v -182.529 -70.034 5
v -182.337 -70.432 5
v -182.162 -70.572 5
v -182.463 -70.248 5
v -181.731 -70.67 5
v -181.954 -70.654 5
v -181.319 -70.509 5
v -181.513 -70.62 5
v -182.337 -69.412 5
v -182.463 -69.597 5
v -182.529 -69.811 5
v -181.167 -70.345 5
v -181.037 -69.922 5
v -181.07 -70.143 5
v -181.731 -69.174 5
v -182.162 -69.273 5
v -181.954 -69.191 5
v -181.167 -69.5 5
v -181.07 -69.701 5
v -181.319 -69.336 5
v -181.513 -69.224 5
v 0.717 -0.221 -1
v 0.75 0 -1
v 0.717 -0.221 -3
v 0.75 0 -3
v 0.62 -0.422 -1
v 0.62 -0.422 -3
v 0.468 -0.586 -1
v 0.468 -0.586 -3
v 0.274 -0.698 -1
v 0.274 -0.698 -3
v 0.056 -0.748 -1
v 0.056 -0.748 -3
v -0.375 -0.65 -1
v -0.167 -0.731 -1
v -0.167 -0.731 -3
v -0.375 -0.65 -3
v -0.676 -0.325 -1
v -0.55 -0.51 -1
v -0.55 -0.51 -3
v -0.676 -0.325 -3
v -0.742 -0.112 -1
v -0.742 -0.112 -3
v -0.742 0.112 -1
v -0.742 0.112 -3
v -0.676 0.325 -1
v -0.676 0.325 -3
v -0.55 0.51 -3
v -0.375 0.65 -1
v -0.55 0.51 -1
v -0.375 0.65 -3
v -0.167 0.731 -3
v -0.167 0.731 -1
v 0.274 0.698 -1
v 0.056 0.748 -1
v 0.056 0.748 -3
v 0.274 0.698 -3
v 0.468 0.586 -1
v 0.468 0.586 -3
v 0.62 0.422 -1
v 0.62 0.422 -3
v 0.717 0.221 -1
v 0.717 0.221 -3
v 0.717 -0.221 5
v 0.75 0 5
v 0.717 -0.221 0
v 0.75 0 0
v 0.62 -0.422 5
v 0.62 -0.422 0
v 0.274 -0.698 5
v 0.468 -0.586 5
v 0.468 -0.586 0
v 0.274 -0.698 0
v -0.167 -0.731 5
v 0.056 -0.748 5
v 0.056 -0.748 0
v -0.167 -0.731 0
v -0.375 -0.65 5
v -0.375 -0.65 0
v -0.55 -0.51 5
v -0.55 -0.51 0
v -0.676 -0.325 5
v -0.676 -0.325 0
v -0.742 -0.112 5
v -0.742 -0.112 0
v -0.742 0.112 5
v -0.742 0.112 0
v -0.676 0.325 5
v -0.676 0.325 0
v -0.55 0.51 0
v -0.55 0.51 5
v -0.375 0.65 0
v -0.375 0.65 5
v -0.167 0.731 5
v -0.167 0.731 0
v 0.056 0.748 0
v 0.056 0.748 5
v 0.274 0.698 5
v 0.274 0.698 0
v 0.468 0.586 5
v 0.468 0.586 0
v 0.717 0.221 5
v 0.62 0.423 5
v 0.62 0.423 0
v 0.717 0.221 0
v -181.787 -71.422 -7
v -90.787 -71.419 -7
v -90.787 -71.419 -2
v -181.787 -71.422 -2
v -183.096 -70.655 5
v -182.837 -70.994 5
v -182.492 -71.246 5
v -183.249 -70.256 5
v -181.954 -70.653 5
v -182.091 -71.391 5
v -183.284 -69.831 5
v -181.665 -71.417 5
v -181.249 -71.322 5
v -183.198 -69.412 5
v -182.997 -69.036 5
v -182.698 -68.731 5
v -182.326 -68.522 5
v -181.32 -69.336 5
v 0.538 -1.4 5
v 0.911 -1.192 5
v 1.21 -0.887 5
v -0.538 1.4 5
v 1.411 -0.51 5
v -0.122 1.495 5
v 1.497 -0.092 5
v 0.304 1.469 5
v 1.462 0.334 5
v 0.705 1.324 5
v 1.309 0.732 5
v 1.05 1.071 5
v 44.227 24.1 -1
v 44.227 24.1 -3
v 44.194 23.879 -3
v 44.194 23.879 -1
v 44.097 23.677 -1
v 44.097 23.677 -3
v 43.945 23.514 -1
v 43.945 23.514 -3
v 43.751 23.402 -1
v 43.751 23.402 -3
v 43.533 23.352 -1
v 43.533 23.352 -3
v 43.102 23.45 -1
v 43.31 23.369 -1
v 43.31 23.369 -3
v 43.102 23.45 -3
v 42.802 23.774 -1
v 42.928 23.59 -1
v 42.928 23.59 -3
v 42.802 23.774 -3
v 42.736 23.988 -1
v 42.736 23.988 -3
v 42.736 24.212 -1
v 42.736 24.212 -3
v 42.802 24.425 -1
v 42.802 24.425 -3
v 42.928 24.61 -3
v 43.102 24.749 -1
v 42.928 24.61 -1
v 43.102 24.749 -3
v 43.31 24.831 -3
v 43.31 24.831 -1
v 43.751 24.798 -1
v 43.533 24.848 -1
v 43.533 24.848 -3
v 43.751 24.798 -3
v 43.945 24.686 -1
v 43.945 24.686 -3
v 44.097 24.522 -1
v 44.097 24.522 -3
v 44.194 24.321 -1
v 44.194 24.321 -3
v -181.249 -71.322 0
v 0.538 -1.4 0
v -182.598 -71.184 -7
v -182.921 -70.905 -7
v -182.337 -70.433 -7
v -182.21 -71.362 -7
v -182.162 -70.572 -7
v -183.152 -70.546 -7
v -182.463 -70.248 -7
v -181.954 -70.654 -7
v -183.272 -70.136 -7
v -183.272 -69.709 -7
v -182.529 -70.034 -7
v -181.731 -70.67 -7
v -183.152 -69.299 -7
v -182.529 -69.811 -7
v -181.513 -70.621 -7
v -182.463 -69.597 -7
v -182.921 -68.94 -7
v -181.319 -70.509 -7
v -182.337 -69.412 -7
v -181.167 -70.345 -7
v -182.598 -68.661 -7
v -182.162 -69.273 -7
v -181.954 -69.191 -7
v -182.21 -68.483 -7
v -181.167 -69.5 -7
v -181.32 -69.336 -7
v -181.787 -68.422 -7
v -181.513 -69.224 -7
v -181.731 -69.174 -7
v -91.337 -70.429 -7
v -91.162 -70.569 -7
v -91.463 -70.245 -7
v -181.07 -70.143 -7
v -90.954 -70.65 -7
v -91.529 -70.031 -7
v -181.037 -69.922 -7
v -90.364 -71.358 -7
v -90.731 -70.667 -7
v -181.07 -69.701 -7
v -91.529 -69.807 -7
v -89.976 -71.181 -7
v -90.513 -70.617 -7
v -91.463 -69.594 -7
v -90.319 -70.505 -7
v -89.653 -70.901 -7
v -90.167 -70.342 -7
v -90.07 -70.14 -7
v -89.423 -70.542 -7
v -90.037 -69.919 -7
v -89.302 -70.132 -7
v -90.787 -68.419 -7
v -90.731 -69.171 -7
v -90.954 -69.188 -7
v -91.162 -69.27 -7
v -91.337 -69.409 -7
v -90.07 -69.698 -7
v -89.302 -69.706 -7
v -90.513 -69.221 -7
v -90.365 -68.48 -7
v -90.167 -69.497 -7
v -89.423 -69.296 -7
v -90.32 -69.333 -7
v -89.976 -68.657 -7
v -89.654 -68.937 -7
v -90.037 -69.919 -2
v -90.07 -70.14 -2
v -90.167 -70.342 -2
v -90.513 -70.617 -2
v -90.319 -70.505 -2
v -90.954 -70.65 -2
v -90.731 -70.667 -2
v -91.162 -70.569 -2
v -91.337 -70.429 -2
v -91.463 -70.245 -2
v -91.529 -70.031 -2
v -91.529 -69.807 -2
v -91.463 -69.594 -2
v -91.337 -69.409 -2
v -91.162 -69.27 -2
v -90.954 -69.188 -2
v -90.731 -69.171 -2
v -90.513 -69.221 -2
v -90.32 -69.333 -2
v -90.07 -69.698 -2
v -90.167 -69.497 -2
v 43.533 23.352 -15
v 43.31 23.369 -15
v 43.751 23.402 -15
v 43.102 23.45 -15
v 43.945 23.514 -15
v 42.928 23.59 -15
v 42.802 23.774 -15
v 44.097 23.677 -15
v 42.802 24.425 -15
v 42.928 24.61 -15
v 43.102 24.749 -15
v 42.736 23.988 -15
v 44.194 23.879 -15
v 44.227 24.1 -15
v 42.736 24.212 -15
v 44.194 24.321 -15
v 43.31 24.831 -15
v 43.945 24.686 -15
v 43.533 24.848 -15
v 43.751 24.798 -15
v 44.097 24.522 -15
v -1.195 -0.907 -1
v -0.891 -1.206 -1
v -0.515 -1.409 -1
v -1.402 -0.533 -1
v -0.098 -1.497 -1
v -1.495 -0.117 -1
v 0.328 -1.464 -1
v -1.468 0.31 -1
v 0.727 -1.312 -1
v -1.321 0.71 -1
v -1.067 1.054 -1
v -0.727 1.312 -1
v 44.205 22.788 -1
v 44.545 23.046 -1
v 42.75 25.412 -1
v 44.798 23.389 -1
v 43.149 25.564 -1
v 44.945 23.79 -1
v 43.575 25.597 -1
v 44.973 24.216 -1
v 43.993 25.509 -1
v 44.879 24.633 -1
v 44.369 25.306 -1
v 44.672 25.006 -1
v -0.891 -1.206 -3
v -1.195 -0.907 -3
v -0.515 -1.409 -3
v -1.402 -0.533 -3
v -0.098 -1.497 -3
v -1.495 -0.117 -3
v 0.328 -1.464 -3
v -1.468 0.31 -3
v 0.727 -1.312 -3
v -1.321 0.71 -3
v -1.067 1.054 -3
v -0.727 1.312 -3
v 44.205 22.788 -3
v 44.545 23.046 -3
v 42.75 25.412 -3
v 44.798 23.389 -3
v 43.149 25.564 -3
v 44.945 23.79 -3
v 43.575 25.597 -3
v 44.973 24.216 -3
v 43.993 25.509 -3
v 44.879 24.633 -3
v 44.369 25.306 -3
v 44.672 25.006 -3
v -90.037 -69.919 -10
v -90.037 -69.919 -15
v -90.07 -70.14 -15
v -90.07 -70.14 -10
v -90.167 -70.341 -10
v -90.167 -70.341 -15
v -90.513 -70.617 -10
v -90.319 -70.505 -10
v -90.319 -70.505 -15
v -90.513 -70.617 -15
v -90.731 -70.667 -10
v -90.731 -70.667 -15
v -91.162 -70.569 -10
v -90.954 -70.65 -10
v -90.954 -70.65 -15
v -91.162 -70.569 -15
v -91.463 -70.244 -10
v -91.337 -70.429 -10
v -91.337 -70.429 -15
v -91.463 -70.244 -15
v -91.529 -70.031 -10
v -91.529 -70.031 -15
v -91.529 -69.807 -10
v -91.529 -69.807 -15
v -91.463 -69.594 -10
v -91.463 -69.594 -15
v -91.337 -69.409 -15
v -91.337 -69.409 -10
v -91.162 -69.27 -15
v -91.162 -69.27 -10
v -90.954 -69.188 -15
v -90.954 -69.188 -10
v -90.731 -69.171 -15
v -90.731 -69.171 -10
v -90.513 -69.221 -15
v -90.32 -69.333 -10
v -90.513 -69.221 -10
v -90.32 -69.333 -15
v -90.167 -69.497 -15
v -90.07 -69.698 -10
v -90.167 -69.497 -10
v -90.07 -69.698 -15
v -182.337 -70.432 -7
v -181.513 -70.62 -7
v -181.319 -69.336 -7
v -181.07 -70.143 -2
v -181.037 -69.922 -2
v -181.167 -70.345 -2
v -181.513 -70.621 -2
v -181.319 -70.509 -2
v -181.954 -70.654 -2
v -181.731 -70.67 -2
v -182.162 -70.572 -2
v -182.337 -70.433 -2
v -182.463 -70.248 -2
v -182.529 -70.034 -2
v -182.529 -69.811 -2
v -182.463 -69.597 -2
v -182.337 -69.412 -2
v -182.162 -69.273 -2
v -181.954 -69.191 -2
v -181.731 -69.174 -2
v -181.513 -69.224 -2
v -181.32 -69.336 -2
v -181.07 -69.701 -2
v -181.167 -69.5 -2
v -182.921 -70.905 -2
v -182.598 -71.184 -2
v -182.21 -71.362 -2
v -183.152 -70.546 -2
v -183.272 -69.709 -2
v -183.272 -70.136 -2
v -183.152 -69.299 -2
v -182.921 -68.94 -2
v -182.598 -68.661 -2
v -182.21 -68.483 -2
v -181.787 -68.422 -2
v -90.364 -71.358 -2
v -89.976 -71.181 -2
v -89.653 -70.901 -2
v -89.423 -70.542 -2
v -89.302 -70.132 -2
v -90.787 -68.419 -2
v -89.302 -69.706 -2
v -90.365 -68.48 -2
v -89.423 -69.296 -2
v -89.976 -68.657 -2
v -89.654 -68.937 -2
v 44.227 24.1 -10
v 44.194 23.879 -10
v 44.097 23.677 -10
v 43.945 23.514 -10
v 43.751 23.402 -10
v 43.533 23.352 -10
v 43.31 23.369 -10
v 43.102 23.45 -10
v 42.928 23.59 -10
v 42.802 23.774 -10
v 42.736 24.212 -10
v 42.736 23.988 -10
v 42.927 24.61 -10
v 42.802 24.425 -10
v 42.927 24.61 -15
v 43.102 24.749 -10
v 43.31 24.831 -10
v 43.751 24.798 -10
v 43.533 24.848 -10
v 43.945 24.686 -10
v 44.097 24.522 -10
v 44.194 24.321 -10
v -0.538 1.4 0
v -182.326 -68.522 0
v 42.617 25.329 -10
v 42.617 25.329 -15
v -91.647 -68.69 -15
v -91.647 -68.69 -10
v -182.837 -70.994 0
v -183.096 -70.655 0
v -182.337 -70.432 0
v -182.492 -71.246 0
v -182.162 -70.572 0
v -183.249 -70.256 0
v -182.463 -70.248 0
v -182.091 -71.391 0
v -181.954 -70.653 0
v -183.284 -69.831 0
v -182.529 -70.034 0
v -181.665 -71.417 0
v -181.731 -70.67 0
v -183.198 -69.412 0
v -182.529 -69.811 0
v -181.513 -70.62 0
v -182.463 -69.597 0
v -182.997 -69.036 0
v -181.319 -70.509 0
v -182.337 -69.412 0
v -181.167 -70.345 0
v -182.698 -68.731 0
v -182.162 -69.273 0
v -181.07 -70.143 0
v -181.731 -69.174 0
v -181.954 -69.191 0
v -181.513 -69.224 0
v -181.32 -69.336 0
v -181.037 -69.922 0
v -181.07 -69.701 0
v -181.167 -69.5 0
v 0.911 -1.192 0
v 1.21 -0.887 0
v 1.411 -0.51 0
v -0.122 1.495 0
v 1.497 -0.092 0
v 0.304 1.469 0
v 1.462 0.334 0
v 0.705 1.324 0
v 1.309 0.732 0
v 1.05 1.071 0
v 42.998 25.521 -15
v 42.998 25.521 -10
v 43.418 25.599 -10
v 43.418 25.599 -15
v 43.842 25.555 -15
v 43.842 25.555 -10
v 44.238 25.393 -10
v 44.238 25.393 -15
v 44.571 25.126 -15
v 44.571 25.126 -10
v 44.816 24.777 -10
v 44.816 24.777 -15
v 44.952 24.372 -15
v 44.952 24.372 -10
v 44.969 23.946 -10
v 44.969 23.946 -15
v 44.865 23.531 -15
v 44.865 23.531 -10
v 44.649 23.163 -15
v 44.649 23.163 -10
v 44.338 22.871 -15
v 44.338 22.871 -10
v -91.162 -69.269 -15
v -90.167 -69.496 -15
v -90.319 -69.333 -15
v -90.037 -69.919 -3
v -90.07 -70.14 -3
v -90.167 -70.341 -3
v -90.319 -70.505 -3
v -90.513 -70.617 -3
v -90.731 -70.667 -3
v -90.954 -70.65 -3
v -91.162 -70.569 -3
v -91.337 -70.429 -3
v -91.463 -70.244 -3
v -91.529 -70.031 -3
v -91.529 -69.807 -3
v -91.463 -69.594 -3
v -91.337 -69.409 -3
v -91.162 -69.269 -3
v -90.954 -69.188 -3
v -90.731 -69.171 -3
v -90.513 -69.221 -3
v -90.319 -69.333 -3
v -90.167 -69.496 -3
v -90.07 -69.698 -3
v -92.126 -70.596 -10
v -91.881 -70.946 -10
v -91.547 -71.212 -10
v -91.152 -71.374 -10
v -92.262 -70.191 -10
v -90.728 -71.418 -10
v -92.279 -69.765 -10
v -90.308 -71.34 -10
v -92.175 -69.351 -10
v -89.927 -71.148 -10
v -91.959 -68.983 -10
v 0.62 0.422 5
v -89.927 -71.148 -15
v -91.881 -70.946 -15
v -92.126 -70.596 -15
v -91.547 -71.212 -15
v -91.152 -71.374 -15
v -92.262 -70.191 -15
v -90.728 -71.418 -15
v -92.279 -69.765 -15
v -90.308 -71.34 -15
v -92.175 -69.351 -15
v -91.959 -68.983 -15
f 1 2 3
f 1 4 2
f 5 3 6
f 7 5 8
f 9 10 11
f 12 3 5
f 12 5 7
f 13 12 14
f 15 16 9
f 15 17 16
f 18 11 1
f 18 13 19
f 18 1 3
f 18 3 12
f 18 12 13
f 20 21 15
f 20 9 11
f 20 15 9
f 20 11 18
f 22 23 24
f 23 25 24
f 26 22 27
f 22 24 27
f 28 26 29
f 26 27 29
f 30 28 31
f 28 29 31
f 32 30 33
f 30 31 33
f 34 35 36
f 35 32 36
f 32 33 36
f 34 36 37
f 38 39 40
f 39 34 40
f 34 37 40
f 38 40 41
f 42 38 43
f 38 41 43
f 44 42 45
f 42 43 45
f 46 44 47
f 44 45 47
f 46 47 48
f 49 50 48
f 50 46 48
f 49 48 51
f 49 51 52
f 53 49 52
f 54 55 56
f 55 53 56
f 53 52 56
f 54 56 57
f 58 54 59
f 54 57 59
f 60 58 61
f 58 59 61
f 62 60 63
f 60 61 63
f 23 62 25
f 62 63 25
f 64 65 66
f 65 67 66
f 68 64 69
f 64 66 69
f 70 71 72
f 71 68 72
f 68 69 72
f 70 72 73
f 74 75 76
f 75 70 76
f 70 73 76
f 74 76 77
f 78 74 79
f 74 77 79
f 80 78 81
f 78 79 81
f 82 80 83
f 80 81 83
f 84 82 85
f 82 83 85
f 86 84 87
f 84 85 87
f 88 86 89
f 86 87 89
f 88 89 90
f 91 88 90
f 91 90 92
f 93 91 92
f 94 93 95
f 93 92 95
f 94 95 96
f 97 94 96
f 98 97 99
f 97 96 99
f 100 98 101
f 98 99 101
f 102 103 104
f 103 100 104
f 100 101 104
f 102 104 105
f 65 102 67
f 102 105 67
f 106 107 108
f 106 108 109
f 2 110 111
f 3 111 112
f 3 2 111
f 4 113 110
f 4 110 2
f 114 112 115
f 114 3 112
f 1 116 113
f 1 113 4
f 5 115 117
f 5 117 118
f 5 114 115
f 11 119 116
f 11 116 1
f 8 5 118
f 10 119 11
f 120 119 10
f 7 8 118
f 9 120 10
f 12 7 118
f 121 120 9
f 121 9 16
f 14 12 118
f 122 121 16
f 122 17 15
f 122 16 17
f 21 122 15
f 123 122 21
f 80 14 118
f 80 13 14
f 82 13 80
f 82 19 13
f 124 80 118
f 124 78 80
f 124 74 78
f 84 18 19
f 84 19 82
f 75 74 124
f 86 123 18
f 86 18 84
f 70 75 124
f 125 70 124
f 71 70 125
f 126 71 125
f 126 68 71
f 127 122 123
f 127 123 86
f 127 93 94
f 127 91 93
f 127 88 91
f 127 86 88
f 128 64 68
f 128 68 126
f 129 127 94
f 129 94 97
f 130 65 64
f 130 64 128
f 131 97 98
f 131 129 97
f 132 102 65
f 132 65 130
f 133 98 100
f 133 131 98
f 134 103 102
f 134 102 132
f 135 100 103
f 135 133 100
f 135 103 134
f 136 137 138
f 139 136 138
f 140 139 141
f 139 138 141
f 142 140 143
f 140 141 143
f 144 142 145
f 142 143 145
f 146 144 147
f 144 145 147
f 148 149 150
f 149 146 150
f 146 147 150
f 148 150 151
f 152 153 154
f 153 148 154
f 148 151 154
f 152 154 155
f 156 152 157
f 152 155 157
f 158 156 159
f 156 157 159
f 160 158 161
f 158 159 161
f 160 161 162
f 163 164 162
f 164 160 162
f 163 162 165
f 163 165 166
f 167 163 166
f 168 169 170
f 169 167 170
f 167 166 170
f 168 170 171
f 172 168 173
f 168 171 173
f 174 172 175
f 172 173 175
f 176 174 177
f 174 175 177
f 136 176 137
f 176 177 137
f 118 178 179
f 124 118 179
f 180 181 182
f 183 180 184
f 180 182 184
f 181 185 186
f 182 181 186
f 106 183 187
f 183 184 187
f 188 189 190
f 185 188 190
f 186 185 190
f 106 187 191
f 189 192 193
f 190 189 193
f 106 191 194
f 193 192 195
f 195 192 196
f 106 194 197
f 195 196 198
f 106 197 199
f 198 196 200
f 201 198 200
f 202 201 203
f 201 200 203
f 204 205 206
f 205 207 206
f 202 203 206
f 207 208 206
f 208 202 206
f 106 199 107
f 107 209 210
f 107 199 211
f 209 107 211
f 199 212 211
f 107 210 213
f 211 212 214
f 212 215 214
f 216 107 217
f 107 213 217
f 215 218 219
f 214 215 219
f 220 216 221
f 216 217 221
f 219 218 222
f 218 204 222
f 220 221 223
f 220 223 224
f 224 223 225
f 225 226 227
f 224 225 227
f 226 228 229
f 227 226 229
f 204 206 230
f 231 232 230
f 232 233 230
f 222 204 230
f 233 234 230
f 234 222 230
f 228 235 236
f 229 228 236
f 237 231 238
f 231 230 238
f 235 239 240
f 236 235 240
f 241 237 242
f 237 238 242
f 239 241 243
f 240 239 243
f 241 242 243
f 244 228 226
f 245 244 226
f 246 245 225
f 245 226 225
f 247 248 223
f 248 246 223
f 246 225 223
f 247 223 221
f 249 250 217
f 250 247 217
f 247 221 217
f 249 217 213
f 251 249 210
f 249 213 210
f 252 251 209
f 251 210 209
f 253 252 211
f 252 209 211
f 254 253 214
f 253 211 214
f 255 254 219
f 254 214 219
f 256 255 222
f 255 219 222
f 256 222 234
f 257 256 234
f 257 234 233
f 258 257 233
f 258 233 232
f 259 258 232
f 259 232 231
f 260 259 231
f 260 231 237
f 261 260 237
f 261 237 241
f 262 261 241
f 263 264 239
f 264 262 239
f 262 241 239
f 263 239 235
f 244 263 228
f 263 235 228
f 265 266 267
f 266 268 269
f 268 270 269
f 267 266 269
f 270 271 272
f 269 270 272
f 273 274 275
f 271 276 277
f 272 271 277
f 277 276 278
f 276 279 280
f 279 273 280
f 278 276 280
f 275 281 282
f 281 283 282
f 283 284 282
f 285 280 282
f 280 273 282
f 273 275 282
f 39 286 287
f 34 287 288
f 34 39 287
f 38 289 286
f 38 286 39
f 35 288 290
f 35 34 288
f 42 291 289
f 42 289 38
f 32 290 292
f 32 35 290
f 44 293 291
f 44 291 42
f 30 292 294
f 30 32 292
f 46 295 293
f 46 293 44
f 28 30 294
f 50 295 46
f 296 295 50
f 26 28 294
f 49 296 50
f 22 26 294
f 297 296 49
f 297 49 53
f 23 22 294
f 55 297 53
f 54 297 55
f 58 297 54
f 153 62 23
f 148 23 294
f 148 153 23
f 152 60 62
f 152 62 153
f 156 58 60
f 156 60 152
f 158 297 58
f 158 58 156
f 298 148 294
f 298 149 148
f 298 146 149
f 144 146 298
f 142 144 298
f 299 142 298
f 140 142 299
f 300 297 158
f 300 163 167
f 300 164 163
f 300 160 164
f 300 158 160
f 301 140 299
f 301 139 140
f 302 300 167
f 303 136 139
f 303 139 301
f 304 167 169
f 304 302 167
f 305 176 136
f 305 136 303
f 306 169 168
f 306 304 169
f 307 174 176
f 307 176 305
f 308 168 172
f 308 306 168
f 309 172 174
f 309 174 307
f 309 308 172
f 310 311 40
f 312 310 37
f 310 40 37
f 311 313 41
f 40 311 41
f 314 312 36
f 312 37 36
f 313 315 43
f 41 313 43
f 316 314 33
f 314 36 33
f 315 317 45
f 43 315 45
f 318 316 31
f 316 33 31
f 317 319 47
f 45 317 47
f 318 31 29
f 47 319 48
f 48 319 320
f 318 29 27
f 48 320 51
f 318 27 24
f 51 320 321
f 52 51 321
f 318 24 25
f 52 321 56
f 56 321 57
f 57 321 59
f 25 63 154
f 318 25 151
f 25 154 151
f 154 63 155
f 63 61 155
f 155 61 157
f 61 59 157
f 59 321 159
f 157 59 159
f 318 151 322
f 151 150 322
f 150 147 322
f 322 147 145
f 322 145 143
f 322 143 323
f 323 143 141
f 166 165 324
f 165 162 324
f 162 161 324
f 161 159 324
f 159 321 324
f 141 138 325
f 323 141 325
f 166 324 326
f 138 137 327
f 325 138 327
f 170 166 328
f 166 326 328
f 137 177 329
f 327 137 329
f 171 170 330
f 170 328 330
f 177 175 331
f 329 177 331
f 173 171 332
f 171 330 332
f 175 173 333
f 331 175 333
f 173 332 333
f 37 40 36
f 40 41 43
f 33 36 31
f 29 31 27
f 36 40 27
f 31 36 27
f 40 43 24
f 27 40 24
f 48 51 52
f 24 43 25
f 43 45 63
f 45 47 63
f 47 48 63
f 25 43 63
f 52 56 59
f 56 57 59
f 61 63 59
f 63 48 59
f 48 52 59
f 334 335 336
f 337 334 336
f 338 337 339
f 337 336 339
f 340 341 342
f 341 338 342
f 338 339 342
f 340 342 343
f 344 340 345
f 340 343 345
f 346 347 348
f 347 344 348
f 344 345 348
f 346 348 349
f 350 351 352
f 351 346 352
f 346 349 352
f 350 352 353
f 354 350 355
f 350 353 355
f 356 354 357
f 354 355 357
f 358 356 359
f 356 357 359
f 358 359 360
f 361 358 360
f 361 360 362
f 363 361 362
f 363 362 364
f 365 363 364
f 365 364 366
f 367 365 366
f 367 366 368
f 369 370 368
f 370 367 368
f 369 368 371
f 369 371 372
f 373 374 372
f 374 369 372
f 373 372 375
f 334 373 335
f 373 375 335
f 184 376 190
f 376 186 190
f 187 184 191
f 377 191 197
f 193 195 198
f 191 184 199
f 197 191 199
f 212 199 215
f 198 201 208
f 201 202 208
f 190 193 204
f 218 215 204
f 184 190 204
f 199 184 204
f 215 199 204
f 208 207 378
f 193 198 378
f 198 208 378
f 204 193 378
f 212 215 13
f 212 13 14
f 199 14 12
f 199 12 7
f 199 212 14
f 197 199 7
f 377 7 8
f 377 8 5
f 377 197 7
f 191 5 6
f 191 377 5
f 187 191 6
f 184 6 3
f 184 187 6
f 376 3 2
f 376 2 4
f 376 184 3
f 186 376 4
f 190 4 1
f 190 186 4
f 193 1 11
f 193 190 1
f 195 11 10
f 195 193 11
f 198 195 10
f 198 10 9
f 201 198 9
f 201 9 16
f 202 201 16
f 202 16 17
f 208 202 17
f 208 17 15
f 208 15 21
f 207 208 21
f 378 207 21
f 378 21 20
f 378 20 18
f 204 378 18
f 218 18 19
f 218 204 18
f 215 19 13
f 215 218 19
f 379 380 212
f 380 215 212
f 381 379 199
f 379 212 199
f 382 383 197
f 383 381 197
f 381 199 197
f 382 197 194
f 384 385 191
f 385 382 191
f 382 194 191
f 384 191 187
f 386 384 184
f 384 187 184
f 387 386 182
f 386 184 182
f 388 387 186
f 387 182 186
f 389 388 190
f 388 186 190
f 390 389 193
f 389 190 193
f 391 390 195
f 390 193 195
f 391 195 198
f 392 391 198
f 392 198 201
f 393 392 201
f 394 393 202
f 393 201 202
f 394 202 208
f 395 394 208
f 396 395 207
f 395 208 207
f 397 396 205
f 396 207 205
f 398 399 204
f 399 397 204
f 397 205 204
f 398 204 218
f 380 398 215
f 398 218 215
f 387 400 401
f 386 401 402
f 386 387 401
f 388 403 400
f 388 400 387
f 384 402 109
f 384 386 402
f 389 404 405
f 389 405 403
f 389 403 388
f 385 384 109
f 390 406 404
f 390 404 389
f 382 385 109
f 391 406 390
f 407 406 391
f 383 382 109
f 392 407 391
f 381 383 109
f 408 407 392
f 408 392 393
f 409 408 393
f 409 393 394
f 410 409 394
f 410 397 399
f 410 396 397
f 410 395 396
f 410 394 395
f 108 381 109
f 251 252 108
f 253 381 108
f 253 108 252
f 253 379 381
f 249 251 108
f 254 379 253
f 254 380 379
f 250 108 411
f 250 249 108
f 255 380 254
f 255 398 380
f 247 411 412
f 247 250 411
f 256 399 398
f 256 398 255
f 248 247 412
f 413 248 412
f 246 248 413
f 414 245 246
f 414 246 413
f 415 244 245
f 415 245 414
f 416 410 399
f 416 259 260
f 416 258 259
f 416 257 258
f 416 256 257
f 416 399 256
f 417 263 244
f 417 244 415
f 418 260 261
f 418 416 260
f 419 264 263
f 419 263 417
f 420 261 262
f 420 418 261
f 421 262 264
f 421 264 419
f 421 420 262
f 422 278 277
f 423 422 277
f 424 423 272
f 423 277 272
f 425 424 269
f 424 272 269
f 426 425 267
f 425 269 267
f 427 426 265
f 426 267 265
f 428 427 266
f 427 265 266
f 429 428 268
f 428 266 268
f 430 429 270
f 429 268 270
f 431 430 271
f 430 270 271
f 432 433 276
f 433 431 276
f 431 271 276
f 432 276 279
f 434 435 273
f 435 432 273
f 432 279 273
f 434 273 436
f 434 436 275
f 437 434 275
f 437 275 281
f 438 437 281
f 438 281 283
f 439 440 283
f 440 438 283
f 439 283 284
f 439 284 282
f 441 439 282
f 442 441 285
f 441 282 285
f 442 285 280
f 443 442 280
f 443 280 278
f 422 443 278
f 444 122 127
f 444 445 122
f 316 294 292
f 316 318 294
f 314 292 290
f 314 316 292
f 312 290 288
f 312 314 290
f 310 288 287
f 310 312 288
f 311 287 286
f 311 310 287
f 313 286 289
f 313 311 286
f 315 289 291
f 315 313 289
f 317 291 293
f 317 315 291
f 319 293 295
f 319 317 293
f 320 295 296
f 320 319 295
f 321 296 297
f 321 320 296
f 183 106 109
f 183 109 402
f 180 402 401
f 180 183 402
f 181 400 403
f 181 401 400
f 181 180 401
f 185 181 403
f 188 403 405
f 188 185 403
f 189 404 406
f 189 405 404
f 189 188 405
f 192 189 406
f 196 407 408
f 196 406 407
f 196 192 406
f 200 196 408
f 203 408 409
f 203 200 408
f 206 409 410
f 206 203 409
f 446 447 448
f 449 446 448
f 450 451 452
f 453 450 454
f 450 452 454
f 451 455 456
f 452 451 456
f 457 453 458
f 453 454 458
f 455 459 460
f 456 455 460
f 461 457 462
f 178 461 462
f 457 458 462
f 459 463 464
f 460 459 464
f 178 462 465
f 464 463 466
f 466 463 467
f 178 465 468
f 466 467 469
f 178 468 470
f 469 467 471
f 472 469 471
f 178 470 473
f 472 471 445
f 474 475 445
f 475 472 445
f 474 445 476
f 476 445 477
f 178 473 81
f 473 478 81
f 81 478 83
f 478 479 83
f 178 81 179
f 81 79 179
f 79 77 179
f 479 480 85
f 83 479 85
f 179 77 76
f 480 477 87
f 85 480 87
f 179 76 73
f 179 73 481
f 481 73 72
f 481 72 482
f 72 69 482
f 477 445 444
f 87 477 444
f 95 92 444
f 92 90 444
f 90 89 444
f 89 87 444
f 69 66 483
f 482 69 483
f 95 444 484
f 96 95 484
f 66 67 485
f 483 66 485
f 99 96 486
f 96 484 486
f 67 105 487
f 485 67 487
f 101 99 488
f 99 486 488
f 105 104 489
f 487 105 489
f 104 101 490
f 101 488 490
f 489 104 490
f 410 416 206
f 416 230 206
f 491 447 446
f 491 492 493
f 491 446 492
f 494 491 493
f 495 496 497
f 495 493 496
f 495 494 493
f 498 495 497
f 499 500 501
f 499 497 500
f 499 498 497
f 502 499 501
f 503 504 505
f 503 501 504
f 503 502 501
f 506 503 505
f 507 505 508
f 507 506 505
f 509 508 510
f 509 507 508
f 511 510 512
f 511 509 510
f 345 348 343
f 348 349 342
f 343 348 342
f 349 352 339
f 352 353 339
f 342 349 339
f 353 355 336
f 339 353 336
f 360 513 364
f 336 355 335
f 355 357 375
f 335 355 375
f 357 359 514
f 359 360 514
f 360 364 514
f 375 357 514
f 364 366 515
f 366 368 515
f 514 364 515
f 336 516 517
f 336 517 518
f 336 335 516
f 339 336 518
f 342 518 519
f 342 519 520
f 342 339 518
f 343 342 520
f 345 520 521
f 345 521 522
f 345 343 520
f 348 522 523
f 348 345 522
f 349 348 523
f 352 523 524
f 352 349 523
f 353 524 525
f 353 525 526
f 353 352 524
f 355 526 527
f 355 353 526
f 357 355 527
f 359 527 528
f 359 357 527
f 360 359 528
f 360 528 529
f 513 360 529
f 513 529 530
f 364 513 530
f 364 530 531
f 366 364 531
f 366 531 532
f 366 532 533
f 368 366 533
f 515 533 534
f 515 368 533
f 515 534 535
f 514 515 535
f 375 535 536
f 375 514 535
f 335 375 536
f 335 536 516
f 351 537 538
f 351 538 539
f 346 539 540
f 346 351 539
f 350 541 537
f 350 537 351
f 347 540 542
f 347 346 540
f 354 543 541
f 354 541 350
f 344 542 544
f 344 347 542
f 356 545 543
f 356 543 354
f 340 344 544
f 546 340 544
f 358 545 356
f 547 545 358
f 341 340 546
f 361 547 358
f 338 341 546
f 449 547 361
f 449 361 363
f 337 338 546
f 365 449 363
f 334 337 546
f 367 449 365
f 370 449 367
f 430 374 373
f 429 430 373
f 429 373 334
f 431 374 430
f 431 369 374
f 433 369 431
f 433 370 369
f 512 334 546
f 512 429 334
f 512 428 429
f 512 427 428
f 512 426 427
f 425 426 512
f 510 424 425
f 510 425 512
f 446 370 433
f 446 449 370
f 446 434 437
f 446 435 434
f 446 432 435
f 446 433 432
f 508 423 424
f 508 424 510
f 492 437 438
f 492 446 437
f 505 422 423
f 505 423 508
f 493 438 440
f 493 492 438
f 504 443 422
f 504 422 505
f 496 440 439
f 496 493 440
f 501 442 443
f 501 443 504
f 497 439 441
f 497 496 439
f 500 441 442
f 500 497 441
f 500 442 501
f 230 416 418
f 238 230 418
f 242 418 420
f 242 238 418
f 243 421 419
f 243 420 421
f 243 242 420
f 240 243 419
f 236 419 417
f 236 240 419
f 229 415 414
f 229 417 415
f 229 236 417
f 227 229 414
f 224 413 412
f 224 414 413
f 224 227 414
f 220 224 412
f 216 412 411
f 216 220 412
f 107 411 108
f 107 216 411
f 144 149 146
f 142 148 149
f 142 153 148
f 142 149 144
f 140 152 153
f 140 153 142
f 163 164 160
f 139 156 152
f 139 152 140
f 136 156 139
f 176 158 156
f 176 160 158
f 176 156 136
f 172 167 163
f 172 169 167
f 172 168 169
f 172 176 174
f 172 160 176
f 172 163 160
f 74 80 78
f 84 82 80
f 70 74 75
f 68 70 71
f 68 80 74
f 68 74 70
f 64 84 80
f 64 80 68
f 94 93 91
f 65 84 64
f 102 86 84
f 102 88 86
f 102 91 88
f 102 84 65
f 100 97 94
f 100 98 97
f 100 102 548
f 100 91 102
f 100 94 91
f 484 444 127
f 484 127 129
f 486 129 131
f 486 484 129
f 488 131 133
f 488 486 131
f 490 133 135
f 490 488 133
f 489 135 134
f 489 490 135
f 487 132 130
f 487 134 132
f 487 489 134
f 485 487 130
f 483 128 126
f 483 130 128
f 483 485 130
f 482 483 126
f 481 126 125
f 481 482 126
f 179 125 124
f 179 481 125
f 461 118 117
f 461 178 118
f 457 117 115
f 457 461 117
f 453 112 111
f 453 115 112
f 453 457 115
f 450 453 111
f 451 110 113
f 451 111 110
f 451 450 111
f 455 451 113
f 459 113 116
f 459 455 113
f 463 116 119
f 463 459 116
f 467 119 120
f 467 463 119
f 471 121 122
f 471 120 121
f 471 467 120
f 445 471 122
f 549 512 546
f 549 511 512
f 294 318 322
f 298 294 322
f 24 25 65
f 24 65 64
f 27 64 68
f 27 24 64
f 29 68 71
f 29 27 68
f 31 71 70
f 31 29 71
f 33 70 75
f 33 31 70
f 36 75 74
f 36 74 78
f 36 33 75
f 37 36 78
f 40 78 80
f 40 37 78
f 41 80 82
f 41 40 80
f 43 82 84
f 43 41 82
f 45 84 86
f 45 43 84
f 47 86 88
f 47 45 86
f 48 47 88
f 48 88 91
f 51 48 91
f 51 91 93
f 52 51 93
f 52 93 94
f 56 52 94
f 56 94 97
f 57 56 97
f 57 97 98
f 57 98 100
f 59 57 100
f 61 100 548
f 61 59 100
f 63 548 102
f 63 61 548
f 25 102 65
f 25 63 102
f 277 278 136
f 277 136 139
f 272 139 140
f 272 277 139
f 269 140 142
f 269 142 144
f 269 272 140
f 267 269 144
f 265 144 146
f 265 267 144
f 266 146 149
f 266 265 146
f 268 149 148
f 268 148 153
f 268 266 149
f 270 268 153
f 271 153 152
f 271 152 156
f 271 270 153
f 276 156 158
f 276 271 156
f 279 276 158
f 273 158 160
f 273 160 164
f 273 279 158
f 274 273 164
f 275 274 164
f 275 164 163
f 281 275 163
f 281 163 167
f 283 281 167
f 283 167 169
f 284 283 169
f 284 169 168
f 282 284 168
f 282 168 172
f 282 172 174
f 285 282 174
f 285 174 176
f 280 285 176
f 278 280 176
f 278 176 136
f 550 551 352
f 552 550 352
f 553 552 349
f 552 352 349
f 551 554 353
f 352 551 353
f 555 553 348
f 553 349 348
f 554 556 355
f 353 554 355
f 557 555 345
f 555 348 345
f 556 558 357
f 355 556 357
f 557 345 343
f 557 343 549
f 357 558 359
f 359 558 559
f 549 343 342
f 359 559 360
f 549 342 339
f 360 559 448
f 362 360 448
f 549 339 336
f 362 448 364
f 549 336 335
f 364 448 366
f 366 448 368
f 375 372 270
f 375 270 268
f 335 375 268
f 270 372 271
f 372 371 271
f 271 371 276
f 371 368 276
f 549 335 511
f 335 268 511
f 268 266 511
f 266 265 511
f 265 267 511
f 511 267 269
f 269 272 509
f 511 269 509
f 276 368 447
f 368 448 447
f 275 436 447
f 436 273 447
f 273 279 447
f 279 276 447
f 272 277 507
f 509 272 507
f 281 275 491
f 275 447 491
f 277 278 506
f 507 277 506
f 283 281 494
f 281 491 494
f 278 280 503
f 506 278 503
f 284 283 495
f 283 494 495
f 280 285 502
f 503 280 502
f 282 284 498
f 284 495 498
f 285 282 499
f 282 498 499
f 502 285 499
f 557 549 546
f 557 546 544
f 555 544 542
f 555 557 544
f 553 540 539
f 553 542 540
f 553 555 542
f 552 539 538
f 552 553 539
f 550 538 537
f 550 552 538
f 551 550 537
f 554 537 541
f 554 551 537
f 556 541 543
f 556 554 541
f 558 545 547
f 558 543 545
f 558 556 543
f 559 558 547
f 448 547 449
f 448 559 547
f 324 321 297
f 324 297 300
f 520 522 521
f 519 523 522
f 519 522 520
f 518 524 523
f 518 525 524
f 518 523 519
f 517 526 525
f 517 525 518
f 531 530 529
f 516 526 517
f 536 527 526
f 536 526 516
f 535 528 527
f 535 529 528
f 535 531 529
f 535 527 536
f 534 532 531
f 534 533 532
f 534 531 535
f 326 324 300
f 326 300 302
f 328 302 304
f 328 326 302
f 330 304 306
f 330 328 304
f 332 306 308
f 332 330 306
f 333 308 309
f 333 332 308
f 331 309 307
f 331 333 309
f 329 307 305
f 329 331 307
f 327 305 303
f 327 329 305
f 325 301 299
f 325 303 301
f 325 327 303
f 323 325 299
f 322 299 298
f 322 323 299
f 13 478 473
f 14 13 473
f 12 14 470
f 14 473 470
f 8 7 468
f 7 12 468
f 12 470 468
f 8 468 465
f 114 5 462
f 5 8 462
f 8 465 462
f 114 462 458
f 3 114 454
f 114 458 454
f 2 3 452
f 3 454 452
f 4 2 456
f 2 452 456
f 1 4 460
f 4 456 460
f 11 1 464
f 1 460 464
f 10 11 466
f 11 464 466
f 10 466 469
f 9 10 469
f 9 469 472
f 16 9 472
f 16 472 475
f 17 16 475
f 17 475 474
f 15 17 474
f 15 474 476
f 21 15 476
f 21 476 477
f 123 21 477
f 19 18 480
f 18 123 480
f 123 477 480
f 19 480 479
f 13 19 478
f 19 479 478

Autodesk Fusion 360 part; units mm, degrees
sketch "Sketch1" plane through (0, 0, 0) normal (0, 1, 0) x (1, 0, 0)
sketch "Sketch2" plane through (0, 0, 0) normal (0, 0, 1) x (1, 0, 0)
  line L0 (0, 0) -> (49.71, 0) construction
  line L1 (43.4773, 24.0999) -> (207.3873, 24.0999) construction
  line L2 (42.617, 25.3286) -> (-91.6502, -68.6863)
  line L3 (44.3377, 22.8712) -> (-89.9295, -71.1438)
  circle A0 centre (-90.7899, -69.915) radius 0.75
  circle A1 centre (43.4773, 24.0999) radius 0.75
  arc A2 (44.3377, 22.8712) -> (42.617, 25.3286) centre (43.4773, 24.0999) ccw
  arc A3 (-91.6502, -68.6863) -> (-89.9295, -71.1438) centre (-90.7899, -69.915) ccw
  line L4 (-181.2514, -71.3151) -> (0.5384, -1.4)
  line L5 (-182.3283, -68.515) -> (-0.5384, 1.4)
  circle A4 centre (-181.7899, -69.915) radius 0.75
  circle A5 centre (0, 0) radius 0.75
  arc A6 (0.5384, -1.4) -> (-0.5384, 1.4) centre (0, 0) ccw
  arc A7 (-182.3283, -68.515) -> (-181.2514, -71.3151) centre (-181.7899, -69.915) ccw
  dimension "d2" = 49.71
  dimension "d5" = 91
  dimension "d16" = 1.5
  dimension "d17" = 1.5
  dimension "d29" = 1.5
  dimension "d30" = 1.5
sketch "Sketch3" plane through (0, 0, 0) normal (0, 0, 1) x (1, 0, 0)
sketch "Sketch4" plane through (0, 0, 0) normal (0, 0, 1) x (1, 0, 0)
  line L0 (100, 0) -> (149.71, 0) construction
  line L1 (100.7272, -1.3119) -> (144.2046, 22.788)
  line L2 (99.2728, 1.3119) -> (142.7501, 25.4118)
  circle A0 centre (100, 0) radius 0.75
  circle A1 centre (143.4773, 24.0999) radius 0.75
  arc A2 (99.2728, 1.3119) -> (100.7272, -1.3119) centre (100, 0) ccw
  arc A3 (144.2046, 22.788) -> (142.7501, 25.4118) centre (143.4773, 24.0999) ccw
  dimension "d6" = 49.71
  dimension "d10" = 1.5
  dimension "d11" = 1.5
extrude "Extrude1" add sketch "Sketch4" along normal blind 2 makes body 1
sketch "Sketch5" plane through (0, 0, 0) normal (0, 0, 1) x (1, 0, 0)
extrude "Extrude2" add sketch "Sketch2" along normal blind 5 separate body contours L2 L3 A2 A3 makes body 2
copy_body "Body->Comp1" bodies 1 removing the originals makes body 3 in component "Component"
copy_body "Body->Comp2" bodies 2 removing the originals makes body 4 in component "Component'"
sketch "Sketch6" plane through (0, 0, 0) normal (0, 0, 1) x (1, 0, 0)
  line L0 (120, 1.5) -> (29, 1.5)
  line L1 (120, -1.5) -> (29, -1.5)
  circle A0 centre (120, 0) radius 0.75
  circle A1 centre (29, 0) radius 0.75
  arc A2 (29, 1.5) -> (29, -1.5) centre (29, 0) ccw
  arc A3 (120, -1.5) -> (120, 1.5) centre (120, 0) ccw
  dimension "d20" = 91
  dimension "d23" = 1.5
  dimension "d24" = 1.5
extrude "Extrude3" add sketch "Sketch6" along normal blind 5 separate body makes body 5
copy_body "Body->Comp3" bodies 5 removing the originals makes body 6 in component "Component''"
extrude "Extrude4" add sketch "Sketch2" along normal blind 5 separate body contours L4 L5 A6 A7 makes body 7
sketch "Sketch7" plane through (0, 0, 0) normal (0, 0, 1) x (1, 0, 0)
  circle A0 centre (-20, 10) radius 0.75
  circle A1 centre (-16, 12) radius 0.75
  circle A2 centre (-13, 13) radius 0.75
  circle A3 centre (-28, 12) radius 0.75
  dimension "d33" = 1.5
  dimension "d34" = 1.5
  dimension "d35" = 1.5
  dimension "d36" = 1.5
extrude "Extrude5" add sketch "Sketch7" along normal blind 15 separate body contours A3 makes body 8
extrude "Extrude6" add sketch "Sketch7" along normal blind 15 separate body contours A0 | A1 | A2 makes body 9 at (-20.3422, 10.6674, 10) makes body 10 at (-16.3422, 12.6674, 10) makes body 11 at (-12.2537, 12.9253, 10)
copy_body "Body->Comp4" bodies 7 removing the originals makes body 12 in component "Component'''"
copy_body "Body->Comp5" bodies 8 removing the originals makes body 13 in component "Component''''"
copy_body "Body->Comp6" bodies 9 removing the originals makes body 14 in component "Component'''''"
copy_body "Body->Comp7" bodies 10 removing the originals makes body 15 in component "Component''''''"
copy_body "Body->Comp8" bodies 11 removing the originals makes body 16 in component "Component'''''''"
move_face "OffsetFaces1" offset 5 1 faces at (-13.1437, 13.4658, 0) on bodies 16 in component "Component'''''''"
move_face "OffsetFaces1'" offset -7 1 faces at (-15.9059, 11.8045, 0) on bodies 15 in component "Component''''''"
move_face "OffsetFaces1''" offset -3 1 faces at (-27.8195, 12.1328, 0) on bodies 13 in component "Component''''"
move_face "OffsetFaces1'''" offset -3 1 faces at (-19.8195, 10.1328, 0) on bodies 14 in component "Component'''''"
move_face "OffsetFaces2" offset -6 1 faces at (-13.2252, 12.8915, 15) on bodies 16 in component "Component'''''''"
component "Component" placed x (1, 0, 0) y (0, 1, 0) z (0, 0, 1) at (-100, 0, -3)
component "Component'" placed x (1, 0.00003, 0) y (-0.00003, 1, 0) z (0, 0, 1) at (0.0007, -0.0013, -15)
component "Component''" placed x (1, 0.000036, 0) y (-0.000036, 1, 0) z (0, 0, 1) at (-210.7871, -69.9234, -7)
component "Component'''" placed x (1, 0.00004, 0) y (-0.00004, 1, 0) z (0, 0, 1) at (0, 0, 0)
component "Component''''" placed x (1, 0.000036, 0) y (-0.000036, 1, 0) z (0, 0, 1) at (-153.7866, -81.9213, -10)
component "Component'''''" placed x (1, 0.00003, 0) y (-0.00003, 1, 0) z (0, 0, 1) at (-70.7868, -79.9184, -18)
component "Component''''''" placed x (1, 0, 0) y (0, 1, 0) z (0, 0, 1) at (16, -12, -10)
component "Component'''''''" placed x (1, 0, 0) y (0, 1, 0) z (0, 0, 1) at (56.4773, 11.0999, -10)
